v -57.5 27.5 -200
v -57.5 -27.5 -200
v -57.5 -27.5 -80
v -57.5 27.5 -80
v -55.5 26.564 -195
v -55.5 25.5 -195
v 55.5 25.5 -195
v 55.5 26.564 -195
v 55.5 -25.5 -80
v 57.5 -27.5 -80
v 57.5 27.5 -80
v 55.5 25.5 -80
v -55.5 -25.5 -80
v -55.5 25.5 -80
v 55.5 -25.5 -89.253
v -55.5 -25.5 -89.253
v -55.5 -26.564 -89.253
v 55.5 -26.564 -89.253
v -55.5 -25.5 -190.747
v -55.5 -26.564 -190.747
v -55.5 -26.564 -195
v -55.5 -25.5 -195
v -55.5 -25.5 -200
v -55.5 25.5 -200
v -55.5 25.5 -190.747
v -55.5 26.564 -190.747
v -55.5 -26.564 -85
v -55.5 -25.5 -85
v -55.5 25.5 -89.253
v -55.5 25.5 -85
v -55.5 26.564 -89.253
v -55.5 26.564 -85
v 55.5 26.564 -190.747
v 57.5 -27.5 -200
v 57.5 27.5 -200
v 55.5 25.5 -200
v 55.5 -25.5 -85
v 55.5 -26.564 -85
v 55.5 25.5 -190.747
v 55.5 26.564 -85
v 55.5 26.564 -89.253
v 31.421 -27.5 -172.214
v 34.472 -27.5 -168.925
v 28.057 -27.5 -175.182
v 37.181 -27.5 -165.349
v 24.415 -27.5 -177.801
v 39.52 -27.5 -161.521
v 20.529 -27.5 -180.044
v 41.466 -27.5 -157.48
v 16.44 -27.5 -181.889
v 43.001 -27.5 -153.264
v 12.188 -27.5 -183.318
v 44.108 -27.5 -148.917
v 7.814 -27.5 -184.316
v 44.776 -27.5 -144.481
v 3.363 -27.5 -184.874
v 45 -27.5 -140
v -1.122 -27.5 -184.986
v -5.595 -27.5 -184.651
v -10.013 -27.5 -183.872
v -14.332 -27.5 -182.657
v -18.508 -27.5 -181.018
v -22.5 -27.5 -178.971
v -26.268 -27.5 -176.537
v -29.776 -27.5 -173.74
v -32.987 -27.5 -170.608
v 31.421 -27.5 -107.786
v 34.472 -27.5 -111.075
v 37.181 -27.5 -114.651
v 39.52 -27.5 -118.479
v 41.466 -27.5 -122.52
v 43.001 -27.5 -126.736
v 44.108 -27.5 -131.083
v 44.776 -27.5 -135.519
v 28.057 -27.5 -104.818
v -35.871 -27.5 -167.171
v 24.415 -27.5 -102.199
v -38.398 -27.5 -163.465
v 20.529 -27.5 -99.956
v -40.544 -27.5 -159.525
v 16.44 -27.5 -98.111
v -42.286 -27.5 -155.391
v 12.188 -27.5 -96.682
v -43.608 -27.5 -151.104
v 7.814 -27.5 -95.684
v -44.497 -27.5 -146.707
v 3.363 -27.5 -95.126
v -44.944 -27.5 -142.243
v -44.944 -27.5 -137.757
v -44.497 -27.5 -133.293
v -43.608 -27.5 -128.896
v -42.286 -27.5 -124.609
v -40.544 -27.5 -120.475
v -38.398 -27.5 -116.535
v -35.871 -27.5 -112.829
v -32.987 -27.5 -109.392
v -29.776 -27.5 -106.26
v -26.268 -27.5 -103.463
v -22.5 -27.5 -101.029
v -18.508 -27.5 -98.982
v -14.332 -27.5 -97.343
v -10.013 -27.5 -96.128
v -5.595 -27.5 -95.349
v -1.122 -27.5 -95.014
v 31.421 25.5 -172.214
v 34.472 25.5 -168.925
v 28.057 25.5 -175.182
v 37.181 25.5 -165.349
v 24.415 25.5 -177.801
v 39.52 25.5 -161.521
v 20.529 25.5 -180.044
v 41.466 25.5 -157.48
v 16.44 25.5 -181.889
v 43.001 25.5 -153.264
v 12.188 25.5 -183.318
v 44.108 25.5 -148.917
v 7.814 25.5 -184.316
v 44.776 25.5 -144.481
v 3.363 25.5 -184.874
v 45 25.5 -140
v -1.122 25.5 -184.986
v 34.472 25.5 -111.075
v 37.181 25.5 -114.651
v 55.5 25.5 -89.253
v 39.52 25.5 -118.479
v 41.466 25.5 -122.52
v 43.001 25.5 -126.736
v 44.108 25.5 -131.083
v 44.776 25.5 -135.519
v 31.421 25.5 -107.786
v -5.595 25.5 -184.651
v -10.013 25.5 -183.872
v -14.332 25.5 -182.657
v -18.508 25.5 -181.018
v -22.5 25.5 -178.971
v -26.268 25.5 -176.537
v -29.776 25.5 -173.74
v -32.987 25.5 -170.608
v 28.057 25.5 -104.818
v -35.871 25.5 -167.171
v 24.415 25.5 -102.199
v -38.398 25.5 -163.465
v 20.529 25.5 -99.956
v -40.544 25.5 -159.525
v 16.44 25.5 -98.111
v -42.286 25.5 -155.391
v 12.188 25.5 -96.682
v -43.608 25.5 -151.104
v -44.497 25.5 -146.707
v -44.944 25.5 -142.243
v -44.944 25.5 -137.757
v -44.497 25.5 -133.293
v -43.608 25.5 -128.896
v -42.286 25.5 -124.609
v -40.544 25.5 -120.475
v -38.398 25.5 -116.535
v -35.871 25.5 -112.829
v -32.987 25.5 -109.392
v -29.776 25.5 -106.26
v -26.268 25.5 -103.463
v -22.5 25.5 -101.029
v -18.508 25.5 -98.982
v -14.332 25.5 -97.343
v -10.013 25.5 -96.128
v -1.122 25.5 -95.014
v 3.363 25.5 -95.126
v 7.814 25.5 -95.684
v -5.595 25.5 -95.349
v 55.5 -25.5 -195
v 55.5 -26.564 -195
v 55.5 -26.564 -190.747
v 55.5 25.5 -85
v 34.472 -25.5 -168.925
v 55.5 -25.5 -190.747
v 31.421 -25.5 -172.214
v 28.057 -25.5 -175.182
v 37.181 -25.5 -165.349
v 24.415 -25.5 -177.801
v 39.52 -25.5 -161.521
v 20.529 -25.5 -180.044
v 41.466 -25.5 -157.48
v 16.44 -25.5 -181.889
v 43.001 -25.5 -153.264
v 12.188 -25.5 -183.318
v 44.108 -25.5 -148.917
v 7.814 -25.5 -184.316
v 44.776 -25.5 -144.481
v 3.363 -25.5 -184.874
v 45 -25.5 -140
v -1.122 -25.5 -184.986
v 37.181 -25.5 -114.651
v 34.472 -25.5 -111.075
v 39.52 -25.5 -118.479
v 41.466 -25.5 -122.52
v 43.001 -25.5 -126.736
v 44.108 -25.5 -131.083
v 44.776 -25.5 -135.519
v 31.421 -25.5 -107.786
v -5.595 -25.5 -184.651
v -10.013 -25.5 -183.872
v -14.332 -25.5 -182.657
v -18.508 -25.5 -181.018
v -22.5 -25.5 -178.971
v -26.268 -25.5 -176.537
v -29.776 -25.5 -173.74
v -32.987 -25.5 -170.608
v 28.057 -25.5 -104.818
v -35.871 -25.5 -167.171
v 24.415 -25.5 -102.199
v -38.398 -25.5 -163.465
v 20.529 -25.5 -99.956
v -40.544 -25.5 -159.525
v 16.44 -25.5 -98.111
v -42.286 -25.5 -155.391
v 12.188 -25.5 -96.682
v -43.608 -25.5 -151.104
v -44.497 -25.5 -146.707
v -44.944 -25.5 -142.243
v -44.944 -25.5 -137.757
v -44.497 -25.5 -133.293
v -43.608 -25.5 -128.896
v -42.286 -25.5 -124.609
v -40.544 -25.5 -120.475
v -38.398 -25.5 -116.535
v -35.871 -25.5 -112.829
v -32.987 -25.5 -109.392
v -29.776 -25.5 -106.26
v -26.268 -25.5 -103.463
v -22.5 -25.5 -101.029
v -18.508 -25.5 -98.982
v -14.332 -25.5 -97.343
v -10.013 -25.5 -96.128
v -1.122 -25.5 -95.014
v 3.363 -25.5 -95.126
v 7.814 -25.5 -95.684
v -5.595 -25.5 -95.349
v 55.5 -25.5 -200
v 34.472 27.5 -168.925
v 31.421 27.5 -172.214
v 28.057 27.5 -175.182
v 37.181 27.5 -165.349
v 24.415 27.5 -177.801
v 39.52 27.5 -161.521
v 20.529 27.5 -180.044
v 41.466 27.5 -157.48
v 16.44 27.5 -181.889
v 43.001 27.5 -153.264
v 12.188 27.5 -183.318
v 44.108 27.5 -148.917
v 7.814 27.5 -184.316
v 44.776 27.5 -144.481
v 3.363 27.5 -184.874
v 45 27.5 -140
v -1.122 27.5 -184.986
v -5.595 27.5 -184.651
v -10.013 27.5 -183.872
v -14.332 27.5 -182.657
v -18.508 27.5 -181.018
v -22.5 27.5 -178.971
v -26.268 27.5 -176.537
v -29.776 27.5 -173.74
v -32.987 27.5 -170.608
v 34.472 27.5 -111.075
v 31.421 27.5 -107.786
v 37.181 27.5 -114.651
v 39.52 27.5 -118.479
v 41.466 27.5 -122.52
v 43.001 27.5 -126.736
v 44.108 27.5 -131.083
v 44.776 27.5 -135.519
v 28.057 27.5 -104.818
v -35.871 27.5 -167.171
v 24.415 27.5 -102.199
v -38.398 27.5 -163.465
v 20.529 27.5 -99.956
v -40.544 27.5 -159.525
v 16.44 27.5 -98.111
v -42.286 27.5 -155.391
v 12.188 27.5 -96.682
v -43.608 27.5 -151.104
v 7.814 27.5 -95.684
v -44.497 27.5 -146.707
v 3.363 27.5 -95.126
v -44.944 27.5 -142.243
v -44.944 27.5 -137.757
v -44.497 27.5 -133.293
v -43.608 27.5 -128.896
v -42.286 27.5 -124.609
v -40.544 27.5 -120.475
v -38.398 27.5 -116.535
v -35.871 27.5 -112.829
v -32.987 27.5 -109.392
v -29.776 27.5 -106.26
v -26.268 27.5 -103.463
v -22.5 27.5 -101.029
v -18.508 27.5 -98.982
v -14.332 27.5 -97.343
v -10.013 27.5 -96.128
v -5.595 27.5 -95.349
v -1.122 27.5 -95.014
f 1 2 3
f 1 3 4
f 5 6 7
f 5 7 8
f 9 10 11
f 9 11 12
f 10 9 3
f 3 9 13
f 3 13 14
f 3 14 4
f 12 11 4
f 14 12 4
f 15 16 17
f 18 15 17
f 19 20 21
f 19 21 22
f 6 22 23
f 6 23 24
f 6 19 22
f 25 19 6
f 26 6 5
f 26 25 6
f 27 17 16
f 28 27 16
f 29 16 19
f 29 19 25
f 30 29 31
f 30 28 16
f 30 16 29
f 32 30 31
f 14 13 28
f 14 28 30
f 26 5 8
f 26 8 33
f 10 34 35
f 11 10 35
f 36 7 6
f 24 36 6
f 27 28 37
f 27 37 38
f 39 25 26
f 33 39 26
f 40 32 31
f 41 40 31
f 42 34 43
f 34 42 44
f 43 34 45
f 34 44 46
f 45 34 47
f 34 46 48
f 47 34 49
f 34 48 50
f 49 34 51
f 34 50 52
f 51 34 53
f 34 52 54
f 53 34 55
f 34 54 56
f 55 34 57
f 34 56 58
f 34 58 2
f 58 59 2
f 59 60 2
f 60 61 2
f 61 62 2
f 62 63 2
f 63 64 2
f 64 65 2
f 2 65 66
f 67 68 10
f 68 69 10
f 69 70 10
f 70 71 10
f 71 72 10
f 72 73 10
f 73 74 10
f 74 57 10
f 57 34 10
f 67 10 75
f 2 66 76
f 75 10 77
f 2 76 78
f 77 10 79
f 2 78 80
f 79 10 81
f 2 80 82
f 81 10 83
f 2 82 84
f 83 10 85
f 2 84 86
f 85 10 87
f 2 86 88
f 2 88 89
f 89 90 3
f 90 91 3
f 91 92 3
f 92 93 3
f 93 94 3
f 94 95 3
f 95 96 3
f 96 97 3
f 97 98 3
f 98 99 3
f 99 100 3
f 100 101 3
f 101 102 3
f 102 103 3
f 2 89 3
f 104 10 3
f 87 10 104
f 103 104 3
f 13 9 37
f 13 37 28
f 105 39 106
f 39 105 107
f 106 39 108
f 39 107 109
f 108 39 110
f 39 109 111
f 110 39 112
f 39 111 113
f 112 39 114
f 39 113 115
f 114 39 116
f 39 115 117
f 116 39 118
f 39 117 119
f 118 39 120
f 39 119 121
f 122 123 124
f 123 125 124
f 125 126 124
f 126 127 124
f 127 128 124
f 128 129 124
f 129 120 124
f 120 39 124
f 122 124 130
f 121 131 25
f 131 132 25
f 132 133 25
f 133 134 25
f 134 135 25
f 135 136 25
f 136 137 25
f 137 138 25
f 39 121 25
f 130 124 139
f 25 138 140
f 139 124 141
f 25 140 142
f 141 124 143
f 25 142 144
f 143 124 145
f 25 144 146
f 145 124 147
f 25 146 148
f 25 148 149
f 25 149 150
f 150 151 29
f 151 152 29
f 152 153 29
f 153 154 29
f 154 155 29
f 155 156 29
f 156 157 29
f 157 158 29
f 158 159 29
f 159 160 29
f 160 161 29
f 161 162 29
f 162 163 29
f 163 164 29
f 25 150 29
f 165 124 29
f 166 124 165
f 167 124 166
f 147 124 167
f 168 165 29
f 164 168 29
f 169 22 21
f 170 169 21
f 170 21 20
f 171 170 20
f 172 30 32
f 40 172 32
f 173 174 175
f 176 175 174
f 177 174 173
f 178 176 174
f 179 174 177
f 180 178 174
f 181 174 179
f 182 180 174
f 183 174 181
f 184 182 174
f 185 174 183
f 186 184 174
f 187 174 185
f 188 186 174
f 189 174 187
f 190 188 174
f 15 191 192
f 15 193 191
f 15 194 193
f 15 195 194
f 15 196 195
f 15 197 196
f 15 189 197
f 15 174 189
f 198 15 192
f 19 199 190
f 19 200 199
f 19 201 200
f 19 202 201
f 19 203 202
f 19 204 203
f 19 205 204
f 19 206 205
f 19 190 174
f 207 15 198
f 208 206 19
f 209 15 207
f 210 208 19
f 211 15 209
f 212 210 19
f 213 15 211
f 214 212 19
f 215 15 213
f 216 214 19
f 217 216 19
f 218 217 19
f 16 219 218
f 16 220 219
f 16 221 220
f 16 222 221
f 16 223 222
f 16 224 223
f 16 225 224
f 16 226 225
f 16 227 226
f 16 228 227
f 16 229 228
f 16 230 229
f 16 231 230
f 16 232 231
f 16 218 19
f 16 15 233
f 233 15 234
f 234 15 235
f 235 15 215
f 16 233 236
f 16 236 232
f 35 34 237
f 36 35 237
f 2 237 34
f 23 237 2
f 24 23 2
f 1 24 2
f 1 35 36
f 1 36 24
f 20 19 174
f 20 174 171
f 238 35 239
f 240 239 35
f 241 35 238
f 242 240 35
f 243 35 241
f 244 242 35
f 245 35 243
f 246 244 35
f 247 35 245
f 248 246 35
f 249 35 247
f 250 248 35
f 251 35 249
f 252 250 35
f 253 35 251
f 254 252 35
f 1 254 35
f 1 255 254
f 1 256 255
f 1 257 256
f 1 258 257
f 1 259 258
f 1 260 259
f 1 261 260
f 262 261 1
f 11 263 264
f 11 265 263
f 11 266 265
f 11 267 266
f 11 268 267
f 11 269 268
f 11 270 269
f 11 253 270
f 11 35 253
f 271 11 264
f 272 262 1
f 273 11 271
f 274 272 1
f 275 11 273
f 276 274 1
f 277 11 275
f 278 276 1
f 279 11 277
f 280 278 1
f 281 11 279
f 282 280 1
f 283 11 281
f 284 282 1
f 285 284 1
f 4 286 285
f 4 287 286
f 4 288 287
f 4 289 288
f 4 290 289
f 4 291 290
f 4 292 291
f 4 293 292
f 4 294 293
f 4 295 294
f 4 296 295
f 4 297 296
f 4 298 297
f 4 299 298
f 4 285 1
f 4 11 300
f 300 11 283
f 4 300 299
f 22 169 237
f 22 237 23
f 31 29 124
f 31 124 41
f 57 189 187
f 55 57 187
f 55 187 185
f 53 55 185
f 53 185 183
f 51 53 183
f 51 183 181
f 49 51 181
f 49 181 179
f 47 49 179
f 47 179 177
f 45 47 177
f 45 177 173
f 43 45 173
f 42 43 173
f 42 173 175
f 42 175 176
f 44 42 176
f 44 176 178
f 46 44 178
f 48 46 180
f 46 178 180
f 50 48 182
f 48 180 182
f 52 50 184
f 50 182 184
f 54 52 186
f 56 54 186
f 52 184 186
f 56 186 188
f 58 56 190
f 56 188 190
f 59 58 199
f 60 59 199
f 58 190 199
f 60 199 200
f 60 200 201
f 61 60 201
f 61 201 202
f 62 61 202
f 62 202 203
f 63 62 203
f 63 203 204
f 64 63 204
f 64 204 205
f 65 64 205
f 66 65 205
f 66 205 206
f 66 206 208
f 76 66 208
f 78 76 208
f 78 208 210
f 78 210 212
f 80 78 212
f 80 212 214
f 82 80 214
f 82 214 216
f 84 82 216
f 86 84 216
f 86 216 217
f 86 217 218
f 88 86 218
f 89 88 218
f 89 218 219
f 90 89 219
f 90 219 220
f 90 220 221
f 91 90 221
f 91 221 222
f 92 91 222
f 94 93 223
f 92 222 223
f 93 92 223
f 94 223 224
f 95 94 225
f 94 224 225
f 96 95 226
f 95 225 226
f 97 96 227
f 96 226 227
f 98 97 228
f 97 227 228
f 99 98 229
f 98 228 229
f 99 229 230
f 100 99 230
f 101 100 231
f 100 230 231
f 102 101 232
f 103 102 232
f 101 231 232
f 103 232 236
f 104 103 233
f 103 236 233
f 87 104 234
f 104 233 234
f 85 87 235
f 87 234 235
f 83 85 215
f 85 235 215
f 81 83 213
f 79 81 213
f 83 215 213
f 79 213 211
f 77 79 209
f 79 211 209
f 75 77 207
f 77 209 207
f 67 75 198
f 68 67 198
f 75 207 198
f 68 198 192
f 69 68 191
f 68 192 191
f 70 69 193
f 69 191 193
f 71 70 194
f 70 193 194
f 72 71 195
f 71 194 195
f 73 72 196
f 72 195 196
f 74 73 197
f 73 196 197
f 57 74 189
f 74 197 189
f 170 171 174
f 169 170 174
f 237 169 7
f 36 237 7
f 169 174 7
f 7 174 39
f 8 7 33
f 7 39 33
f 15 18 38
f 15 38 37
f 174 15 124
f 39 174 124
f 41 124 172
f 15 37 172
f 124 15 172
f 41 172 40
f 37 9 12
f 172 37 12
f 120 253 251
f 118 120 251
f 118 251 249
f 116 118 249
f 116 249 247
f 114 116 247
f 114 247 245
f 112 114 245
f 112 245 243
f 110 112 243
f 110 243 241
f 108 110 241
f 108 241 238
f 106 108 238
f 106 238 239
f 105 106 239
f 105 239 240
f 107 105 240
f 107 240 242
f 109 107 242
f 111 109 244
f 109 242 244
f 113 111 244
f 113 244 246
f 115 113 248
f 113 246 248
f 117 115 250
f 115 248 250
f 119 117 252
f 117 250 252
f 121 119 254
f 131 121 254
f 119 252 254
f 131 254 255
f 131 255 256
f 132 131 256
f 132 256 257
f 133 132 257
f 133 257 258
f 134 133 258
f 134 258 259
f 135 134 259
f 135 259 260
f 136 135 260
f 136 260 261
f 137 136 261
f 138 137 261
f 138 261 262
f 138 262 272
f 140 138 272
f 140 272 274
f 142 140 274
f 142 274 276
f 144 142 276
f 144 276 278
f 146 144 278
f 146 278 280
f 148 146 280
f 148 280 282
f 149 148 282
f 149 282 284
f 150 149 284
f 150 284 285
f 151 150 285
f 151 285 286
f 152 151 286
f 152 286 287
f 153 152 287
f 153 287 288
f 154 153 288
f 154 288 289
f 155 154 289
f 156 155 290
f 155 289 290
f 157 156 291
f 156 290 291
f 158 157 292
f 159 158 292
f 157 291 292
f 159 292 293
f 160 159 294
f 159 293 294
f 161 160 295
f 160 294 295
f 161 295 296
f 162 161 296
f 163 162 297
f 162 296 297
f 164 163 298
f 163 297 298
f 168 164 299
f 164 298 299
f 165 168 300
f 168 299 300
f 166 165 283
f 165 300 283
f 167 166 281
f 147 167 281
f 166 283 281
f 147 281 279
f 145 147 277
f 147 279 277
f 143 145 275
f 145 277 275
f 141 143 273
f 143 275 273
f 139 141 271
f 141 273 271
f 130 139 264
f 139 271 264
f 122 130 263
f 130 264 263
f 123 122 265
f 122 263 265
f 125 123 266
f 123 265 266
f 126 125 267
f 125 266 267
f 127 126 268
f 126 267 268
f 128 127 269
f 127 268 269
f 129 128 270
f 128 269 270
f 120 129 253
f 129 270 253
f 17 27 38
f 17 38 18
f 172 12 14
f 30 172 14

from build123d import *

# Parameters (mm, degrees)
SKETCH4_W               = 115
SKETCH4_H               = 55
SKETCH4_W_2             = 111
SKETCH4_H_2             = 51
FLAT_SURFACE_DEPTH      = 120
SKETCH9_R               = 45
CUT_EXTRUDE1_DEPTH      = 1
CUT_EXTRUDE1_DEPTH_BACK = 55
SKETCH10_W              = 4.252555104
SKETCH10_H              = 1.06386625
CUT_EXTRUDE2_DEPTH      = 111
MIRROR2_COPY_1_SKETCH_W = 4.252555104
MIRROR2_COPY_1_SKETCH_H = 1.06386625
MIRROR2_COPY_1_DEPTH    = 111


with BuildPart() as part:
    # Sketch4 → Flat-surface (new body)
    with BuildSketch(Plane(origin=(0, 0, -80), x_dir=(-1, 0, 0), z_dir=(0, 0, -1))):
        Rectangle(SKETCH4_W, SKETCH4_H)
        Rectangle(SKETCH4_W_2, SKETCH4_H_2, mode=Mode.SUBTRACT)
    extrude(amount=FLAT_SURFACE_DEPTH)

    # Sketch9 → Cut-Extrude1 (cut, two sides)
    with BuildSketch(Plane(origin=(0, 27.5, 0), x_dir=(1, 0, 0), z_dir=(0, 1, 0))) as cut_extrude1_sk:
        with Locations((0, 140)):
            Circle(SKETCH9_R)
    extrude(amount=CUT_EXTRUDE1_DEPTH, mode=Mode.SUBTRACT)
    extrude(cut_extrude1_sk.sketch, amount=-CUT_EXTRUDE1_DEPTH_BACK, mode=Mode.SUBTRACT)

    # Sketch10 → Cut-Extrude2 (cut)
    with BuildSketch(Plane(origin=(-55.5, 0, 0), x_dir=(0, 0, -1), z_dir=(1, 0, 0))):
        with Locations((87.126277552, 26.031933125)):
            Rectangle(SKETCH10_W, SKETCH10_H)
    cut_extrude2 = extrude(amount=CUT_EXTRUDE2_DEPTH, mode=Mode.SUBTRACT)

    # Mirror1: Cut-Extrude2 across plane
    add(cut_extrude2.mirror(Plane.ZX), mode=Mode.SUBTRACT)

    # Mirror2: Cut-Extrude2 across plane
    add(cut_extrude2.mirror(Plane(origin=(0, 0, -140), x_dir=(1, 0, 0), z_dir=(0, 0, -1))), mode=Mode.SUBTRACT)

    # Mirror2 copy 1 sketch → Mirror2 copy 1 (cut)
    with BuildSketch(Plane(origin=(-55.5, 0, -280), x_dir=(0, 0, 1), z_dir=(1, 0, 0))):
        with Locations((87.126277552, 26.031933125)):
            Rectangle(MIRROR2_COPY_1_SKETCH_W, MIRROR2_COPY_1_SKETCH_H)
    extrude(amount=MIRROR2_COPY_1_DEPTH, mode=Mode.SUBTRACT)


solid = part.part
